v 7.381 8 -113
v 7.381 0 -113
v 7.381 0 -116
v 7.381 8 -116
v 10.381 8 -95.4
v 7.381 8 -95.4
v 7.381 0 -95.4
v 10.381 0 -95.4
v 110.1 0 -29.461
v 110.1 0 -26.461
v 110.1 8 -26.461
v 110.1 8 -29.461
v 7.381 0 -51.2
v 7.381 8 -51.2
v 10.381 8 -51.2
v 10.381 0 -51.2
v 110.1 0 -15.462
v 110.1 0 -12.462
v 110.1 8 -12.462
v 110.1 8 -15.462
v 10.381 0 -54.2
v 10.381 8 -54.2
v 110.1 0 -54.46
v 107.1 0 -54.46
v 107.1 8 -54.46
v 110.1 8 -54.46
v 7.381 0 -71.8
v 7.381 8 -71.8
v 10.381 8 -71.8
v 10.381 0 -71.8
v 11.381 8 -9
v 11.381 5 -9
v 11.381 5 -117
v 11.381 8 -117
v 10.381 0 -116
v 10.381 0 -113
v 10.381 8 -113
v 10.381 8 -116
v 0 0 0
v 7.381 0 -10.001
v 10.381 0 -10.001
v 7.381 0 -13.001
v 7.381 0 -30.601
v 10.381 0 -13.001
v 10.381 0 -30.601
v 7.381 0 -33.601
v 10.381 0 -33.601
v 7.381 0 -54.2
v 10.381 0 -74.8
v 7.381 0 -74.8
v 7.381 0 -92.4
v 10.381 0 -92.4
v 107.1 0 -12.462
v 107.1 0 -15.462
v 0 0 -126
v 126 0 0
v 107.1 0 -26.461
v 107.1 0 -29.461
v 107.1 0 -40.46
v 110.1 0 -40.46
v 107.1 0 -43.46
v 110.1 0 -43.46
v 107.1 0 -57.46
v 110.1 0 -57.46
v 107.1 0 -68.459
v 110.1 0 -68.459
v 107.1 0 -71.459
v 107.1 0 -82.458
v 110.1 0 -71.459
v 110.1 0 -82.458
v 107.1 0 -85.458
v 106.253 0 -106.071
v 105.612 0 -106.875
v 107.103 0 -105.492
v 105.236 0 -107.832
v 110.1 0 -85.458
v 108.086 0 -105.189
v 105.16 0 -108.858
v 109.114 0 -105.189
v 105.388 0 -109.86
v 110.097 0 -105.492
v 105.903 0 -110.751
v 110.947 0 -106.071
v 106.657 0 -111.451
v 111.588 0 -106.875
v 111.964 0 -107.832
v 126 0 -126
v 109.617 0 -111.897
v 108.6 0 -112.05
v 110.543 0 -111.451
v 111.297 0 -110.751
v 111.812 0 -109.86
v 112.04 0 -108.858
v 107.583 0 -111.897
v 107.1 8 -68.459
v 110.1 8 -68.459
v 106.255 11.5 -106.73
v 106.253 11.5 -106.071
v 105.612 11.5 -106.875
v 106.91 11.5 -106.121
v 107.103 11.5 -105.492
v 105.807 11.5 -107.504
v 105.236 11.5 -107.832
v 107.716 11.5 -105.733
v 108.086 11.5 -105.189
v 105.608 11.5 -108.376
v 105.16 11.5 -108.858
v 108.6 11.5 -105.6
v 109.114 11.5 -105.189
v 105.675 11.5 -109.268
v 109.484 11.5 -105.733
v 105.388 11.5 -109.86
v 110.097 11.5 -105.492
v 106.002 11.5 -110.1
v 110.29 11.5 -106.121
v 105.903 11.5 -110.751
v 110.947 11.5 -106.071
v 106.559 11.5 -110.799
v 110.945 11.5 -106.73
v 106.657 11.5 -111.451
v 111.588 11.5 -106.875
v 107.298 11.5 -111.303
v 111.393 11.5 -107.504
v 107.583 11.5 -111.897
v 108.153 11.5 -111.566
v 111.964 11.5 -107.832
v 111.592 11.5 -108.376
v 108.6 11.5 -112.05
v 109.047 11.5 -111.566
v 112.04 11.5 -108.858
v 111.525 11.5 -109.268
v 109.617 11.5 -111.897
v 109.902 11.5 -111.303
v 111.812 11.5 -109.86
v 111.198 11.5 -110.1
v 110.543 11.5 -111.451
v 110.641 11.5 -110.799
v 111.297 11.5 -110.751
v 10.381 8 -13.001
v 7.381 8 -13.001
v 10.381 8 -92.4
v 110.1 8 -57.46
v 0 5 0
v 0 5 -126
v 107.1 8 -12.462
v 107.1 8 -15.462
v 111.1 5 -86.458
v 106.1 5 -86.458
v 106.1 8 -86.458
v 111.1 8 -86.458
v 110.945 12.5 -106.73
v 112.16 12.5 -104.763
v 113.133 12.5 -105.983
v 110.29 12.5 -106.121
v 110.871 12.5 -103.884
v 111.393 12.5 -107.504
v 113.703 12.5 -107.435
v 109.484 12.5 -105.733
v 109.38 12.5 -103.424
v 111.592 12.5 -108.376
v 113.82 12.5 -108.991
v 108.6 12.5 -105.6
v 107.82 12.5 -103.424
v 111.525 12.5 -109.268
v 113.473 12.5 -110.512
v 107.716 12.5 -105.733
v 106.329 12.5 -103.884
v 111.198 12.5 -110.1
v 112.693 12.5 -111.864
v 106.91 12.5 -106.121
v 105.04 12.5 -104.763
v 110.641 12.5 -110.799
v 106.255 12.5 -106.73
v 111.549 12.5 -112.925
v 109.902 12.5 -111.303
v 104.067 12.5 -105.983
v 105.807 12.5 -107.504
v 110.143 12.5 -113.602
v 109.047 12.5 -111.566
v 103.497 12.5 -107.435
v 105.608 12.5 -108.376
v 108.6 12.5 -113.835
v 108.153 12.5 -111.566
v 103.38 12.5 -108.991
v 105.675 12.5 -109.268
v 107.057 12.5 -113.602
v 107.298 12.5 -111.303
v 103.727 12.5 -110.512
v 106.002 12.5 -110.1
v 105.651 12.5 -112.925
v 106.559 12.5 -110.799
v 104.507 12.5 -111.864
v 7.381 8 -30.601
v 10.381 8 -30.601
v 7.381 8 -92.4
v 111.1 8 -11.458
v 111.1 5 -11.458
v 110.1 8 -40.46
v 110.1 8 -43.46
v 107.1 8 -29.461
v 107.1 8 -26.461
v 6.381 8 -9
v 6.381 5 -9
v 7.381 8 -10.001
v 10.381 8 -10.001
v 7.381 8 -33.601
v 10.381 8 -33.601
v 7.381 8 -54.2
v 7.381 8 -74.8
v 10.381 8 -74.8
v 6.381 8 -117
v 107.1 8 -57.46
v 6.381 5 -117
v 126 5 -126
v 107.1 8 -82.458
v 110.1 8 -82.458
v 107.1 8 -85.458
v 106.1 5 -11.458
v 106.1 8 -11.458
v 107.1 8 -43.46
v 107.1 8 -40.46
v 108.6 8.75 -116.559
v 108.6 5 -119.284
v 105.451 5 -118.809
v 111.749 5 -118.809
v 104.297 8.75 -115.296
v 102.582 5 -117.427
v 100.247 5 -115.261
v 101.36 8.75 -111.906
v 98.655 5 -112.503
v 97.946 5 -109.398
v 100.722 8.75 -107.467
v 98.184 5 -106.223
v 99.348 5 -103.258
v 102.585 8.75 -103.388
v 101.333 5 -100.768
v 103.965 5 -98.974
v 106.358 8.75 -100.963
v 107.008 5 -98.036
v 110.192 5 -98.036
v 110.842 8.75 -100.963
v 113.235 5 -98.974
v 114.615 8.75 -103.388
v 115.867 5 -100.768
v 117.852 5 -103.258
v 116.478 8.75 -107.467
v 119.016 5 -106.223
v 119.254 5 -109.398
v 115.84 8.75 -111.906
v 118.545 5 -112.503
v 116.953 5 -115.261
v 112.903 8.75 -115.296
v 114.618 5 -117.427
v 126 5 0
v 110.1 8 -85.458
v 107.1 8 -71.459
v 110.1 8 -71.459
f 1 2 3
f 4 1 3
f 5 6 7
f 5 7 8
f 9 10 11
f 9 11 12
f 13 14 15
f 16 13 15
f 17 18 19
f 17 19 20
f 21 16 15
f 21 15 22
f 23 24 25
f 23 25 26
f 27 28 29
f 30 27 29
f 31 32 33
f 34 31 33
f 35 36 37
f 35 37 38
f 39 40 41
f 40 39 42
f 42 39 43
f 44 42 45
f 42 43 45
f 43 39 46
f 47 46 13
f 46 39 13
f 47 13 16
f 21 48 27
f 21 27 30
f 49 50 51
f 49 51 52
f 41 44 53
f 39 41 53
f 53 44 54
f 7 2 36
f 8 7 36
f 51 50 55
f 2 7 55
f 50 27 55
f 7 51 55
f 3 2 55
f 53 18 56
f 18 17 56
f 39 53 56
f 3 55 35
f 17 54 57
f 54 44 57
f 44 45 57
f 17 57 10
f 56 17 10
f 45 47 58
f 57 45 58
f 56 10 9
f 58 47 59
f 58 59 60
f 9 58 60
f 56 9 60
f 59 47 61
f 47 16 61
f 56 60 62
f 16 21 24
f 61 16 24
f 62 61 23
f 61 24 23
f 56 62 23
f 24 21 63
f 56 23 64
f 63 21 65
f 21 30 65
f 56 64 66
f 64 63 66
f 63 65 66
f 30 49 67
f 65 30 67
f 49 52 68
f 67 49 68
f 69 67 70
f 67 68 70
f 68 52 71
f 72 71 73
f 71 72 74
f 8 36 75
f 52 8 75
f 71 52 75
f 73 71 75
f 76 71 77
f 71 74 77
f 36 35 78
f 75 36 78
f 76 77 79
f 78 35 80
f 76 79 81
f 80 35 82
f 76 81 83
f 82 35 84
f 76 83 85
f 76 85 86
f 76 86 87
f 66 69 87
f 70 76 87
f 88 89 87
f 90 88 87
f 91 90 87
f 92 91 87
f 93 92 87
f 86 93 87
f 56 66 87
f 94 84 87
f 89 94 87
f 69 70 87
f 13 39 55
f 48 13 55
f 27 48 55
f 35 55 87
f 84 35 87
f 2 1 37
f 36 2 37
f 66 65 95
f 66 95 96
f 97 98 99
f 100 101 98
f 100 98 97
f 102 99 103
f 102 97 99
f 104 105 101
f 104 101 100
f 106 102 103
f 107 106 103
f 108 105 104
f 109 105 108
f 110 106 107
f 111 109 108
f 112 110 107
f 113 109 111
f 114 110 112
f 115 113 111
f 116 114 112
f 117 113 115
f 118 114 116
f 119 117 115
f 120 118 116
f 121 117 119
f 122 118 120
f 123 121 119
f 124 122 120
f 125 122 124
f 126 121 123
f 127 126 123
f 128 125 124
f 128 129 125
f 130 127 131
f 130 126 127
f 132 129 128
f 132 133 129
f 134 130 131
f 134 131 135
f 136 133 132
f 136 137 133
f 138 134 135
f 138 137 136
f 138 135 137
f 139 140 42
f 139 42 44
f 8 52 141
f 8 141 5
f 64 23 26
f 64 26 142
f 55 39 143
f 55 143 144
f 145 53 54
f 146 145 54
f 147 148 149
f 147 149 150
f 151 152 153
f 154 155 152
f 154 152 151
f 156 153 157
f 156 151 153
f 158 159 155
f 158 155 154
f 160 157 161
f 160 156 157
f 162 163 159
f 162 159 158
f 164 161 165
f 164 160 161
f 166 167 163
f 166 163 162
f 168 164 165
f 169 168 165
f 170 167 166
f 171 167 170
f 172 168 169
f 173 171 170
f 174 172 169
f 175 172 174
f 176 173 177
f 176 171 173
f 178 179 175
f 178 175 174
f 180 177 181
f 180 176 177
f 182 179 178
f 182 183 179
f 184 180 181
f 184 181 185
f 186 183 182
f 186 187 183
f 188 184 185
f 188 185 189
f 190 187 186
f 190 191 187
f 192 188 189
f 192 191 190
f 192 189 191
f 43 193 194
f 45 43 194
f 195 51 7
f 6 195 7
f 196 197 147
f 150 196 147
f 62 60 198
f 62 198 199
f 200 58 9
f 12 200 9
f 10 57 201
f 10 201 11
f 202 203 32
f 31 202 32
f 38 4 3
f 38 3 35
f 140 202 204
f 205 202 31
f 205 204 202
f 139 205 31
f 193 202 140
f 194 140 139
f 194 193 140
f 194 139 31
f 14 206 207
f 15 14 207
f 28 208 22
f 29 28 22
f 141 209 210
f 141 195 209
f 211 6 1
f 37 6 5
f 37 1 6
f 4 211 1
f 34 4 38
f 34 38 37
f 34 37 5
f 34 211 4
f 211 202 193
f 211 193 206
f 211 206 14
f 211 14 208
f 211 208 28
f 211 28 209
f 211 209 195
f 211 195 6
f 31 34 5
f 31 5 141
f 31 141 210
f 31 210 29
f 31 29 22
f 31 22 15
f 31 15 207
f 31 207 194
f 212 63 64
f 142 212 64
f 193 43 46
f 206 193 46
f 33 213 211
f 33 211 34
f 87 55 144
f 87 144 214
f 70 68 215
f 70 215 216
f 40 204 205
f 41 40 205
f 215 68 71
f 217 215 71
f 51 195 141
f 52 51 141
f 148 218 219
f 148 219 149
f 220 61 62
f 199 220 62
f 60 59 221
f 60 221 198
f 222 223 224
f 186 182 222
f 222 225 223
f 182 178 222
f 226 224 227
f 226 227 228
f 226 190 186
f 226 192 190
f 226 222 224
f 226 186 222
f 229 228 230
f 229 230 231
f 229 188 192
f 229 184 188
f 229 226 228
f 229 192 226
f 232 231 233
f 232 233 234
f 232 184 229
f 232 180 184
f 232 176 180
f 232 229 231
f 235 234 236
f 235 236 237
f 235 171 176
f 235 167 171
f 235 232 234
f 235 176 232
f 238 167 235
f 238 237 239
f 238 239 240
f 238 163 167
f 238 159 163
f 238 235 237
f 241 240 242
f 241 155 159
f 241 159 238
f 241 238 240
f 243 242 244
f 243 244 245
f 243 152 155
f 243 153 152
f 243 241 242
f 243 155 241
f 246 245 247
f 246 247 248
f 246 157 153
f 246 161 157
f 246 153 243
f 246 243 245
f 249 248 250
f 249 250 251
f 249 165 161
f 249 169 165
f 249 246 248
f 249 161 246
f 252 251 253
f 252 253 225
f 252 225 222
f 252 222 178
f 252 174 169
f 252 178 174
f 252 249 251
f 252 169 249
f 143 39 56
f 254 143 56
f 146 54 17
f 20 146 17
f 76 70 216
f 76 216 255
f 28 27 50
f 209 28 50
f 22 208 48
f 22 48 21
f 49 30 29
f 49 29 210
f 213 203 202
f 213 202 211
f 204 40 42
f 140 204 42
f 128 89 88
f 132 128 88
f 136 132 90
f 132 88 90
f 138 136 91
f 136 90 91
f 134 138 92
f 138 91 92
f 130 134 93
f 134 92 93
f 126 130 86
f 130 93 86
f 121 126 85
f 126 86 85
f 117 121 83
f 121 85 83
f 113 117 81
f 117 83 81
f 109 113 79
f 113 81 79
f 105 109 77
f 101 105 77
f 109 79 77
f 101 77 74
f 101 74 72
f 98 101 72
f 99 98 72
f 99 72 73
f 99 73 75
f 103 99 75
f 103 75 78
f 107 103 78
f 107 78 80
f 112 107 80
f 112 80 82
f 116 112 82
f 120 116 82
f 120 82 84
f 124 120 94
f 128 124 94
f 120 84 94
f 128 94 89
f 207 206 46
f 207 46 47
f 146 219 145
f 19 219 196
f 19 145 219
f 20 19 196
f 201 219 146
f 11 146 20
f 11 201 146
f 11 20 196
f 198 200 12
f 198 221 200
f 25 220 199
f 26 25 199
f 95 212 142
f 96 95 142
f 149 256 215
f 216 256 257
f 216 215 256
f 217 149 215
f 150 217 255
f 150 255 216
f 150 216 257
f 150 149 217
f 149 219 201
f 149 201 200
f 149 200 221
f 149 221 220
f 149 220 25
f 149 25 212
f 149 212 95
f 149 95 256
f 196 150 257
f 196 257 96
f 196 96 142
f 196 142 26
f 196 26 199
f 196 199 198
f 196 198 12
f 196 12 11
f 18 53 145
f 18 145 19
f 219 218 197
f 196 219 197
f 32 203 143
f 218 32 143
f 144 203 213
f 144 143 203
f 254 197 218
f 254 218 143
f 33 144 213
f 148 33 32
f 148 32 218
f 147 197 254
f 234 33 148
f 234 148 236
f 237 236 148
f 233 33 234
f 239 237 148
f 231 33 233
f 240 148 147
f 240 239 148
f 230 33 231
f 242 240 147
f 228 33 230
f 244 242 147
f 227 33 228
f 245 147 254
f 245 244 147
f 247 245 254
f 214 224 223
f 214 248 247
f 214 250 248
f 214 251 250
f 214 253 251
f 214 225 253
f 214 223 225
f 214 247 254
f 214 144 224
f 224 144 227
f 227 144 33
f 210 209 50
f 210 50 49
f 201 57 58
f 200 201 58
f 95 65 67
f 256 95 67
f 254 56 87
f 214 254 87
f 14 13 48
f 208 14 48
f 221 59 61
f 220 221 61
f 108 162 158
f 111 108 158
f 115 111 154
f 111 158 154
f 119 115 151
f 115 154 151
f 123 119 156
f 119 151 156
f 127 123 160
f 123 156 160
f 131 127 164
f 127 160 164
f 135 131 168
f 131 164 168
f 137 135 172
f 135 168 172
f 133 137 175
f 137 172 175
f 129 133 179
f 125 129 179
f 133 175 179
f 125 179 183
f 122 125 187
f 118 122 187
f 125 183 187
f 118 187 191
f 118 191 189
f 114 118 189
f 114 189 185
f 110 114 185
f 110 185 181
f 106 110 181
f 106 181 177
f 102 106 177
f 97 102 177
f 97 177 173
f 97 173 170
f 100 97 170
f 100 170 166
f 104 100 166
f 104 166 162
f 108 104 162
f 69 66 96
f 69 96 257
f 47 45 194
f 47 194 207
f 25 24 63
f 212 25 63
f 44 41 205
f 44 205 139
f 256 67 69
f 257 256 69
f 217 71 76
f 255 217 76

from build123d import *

# Parameters (mm, degrees)
SKETCH1_W           = 126
SKETCH1_H           = 126
BOSS_EXTRUDE1_DEPTH = 5
SKETCH3_R           = 12.5
BOSS_EXTRUDE2_DEPTH = 7.5
SKETCH4_R           = 3.45
CUT_EXTRUDE1_DEPTH  = 11.5
SKETCH6_R           = 3
CUT_EXTRUDE2_DEPTH  = 179.628805068
CHAMFER1_SIZE       = 10
CHAMFER1_SIZE_2     = 7.26542528
SKETCH9_W           = 5
SKETCH9_H           = 75
BOSS_EXTRUDE4_DEPTH = 3
SKETCH10_W          = 3
SKETCH10_H          = 3
CUT_EXTRUDE4_DEPTH  = 179.370401132
SKETCH11_W          = 5
SKETCH11_H          = 108
BOSS_EXTRUDE5_DEPTH = 3
SKETCH12_W          = 3
SKETCH12_H          = 3
CUT_EXTRUDE5_DEPTH  = 179.370401132


with BuildPart() as part:
    # Sketch1 → Boss-Extrude1 (new body)
    with BuildSketch(Plane(origin=(0, 0, 0), x_dir=(1, 0, 0), z_dir=(0, 1, 0))):
        with Locations((63, 63)):
            Rectangle(SKETCH1_W, SKETCH1_H)
    extrude(amount=BOSS_EXTRUDE1_DEPTH)

    # Sketch3 → Boss-Extrude2 (add)
    with BuildSketch(Plane(origin=(0, 5, 0), x_dir=(1, 0, 0), z_dir=(0, 1, 0))):
        with Locations(Location((108.6, 108.6, 0), (0, 0, 90))):
            Circle(SKETCH3_R)
    extrude(amount=BOSS_EXTRUDE2_DEPTH)

    # Sketch4 → Cut-Extrude1 (cut)
    with BuildSketch(Plane.XZ):
        with Locations(Location((108.6, -108.6, 0), (0, 0, 270))):
            Circle(SKETCH4_R)
    extrude(amount=-CUT_EXTRUDE1_DEPTH, mode=Mode.SUBTRACT)

    # Sketch6 → Cut-Extrude2 (cut, through all)
    with BuildSketch(Plane(origin=(0, 12.5, 0), x_dir=(1, 0, 0), z_dir=(0, 1, 0))):
        with Locations(Location((108.6, 108.6, 0), (0, 0, 270))):
            Circle(SKETCH6_R)
    extrude(amount=-CUT_EXTRUDE2_DEPTH, mode=Mode.SUBTRACT)

    # Chamfer1
    # the kernel refuses this chamfer: 10, 7.26542528 mm, written as the material it takes off along each edge
    with BuildSketch(Plane(origin=(108.6, 12.5, -108.6), x_dir=(0, 0, -1), z_dir=(1, 0, 0))) as chamfer1_piece_1_section:
        Polygon((12.5, -CHAMFER1_SIZE), (12.5 - CHAMFER1_SIZE_2, 0), (12.5, 0), align=None)
    chamfer1_piece_1 = revolve(axis=Axis((108.6, 12.5, -108.6), (0, 1, 0)), mode=Mode.PRIVATE)
    chamfer1_piece_1 = split(chamfer1_piece_1, bisect_by=Plane(origin=(108.6, 5, -100.650989912), z_dir=(0, 1, 0)), keep=Keep.TOP, mode=Mode.PRIVATE)
    add(chamfer1_piece_1, mode=Mode.SUBTRACT)

    # Sketch9 → Boss-Extrude4 (add)
    with BuildSketch(Plane(origin=(0, 5, 0), x_dir=(1, 0, 0), z_dir=(0, 1, 0))):
        with Locations((108.6, 48.95817816)):
            Rectangle(SKETCH9_W, SKETCH9_H)
    extrude(amount=BOSS_EXTRUDE4_DEPTH)

    # Sketch10 → Cut-Extrude4 (cut, through all)
    with BuildSketch(Plane(origin=(0, 8, 0), x_dir=(1, 0, 0), z_dir=(0, 1, 0))):
        with Locations((108.6, 83.95817816)):
            Rectangle(SKETCH10_W, SKETCH10_H)
        with Locations((108.6, 69.958932274)):
            Rectangle(SKETCH10_W, SKETCH10_H)
        with Locations((108.6, 55.959686388)):
            Rectangle(SKETCH10_W, SKETCH10_H)
        with Locations((108.6, 41.960440502)):
            Rectangle(SKETCH10_W, SKETCH10_H)
        with Locations((108.6, 27.961194616)):
            Rectangle(SKETCH10_W, SKETCH10_H)
        with Locations((108.6, 13.96194873)):
            Rectangle(SKETCH10_W, SKETCH10_H)
    extrude(amount=-CUT_EXTRUDE4_DEPTH, mode=Mode.SUBTRACT)

    # Sketch11 → Boss-Extrude5 (add)
    with BuildSketch(Plane(origin=(0, 5, 0), x_dir=(1, 0, 0), z_dir=(0, 1, 0))):
        with Locations((8.881061813, 63)):
            Rectangle(SKETCH11_W, SKETCH11_H)
    extrude(amount=BOSS_EXTRUDE5_DEPTH)

    # Sketch12 → Cut-Extrude5 (cut, through all)
    with BuildSketch(Plane(origin=(0, 8, 0), x_dir=(1, 0, 0), z_dir=(0, 1, 0))):
        with Locations((8.881061813, 114.5)):
            Rectangle(SKETCH12_W, SKETCH12_H)
        with Locations((8.881061813, 93.900163021)):
            Rectangle(SKETCH12_W, SKETCH12_H)
        with Locations((8.881061813, 73.300326041)):
            Rectangle(SKETCH12_W, SKETCH12_H)
        with Locations((8.881061813, 52.700489062)):
            Rectangle(SKETCH12_W, SKETCH12_H)
        with Locations((8.881061813, 32.100652082)):
            Rectangle(SKETCH12_W, SKETCH12_H)
        with Locations((8.881061813, 11.500815103)):
            Rectangle(SKETCH12_W, SKETCH12_H)
    extrude(amount=-CUT_EXTRUDE5_DEPTH, mode=Mode.SUBTRACT)


solid = part.part
